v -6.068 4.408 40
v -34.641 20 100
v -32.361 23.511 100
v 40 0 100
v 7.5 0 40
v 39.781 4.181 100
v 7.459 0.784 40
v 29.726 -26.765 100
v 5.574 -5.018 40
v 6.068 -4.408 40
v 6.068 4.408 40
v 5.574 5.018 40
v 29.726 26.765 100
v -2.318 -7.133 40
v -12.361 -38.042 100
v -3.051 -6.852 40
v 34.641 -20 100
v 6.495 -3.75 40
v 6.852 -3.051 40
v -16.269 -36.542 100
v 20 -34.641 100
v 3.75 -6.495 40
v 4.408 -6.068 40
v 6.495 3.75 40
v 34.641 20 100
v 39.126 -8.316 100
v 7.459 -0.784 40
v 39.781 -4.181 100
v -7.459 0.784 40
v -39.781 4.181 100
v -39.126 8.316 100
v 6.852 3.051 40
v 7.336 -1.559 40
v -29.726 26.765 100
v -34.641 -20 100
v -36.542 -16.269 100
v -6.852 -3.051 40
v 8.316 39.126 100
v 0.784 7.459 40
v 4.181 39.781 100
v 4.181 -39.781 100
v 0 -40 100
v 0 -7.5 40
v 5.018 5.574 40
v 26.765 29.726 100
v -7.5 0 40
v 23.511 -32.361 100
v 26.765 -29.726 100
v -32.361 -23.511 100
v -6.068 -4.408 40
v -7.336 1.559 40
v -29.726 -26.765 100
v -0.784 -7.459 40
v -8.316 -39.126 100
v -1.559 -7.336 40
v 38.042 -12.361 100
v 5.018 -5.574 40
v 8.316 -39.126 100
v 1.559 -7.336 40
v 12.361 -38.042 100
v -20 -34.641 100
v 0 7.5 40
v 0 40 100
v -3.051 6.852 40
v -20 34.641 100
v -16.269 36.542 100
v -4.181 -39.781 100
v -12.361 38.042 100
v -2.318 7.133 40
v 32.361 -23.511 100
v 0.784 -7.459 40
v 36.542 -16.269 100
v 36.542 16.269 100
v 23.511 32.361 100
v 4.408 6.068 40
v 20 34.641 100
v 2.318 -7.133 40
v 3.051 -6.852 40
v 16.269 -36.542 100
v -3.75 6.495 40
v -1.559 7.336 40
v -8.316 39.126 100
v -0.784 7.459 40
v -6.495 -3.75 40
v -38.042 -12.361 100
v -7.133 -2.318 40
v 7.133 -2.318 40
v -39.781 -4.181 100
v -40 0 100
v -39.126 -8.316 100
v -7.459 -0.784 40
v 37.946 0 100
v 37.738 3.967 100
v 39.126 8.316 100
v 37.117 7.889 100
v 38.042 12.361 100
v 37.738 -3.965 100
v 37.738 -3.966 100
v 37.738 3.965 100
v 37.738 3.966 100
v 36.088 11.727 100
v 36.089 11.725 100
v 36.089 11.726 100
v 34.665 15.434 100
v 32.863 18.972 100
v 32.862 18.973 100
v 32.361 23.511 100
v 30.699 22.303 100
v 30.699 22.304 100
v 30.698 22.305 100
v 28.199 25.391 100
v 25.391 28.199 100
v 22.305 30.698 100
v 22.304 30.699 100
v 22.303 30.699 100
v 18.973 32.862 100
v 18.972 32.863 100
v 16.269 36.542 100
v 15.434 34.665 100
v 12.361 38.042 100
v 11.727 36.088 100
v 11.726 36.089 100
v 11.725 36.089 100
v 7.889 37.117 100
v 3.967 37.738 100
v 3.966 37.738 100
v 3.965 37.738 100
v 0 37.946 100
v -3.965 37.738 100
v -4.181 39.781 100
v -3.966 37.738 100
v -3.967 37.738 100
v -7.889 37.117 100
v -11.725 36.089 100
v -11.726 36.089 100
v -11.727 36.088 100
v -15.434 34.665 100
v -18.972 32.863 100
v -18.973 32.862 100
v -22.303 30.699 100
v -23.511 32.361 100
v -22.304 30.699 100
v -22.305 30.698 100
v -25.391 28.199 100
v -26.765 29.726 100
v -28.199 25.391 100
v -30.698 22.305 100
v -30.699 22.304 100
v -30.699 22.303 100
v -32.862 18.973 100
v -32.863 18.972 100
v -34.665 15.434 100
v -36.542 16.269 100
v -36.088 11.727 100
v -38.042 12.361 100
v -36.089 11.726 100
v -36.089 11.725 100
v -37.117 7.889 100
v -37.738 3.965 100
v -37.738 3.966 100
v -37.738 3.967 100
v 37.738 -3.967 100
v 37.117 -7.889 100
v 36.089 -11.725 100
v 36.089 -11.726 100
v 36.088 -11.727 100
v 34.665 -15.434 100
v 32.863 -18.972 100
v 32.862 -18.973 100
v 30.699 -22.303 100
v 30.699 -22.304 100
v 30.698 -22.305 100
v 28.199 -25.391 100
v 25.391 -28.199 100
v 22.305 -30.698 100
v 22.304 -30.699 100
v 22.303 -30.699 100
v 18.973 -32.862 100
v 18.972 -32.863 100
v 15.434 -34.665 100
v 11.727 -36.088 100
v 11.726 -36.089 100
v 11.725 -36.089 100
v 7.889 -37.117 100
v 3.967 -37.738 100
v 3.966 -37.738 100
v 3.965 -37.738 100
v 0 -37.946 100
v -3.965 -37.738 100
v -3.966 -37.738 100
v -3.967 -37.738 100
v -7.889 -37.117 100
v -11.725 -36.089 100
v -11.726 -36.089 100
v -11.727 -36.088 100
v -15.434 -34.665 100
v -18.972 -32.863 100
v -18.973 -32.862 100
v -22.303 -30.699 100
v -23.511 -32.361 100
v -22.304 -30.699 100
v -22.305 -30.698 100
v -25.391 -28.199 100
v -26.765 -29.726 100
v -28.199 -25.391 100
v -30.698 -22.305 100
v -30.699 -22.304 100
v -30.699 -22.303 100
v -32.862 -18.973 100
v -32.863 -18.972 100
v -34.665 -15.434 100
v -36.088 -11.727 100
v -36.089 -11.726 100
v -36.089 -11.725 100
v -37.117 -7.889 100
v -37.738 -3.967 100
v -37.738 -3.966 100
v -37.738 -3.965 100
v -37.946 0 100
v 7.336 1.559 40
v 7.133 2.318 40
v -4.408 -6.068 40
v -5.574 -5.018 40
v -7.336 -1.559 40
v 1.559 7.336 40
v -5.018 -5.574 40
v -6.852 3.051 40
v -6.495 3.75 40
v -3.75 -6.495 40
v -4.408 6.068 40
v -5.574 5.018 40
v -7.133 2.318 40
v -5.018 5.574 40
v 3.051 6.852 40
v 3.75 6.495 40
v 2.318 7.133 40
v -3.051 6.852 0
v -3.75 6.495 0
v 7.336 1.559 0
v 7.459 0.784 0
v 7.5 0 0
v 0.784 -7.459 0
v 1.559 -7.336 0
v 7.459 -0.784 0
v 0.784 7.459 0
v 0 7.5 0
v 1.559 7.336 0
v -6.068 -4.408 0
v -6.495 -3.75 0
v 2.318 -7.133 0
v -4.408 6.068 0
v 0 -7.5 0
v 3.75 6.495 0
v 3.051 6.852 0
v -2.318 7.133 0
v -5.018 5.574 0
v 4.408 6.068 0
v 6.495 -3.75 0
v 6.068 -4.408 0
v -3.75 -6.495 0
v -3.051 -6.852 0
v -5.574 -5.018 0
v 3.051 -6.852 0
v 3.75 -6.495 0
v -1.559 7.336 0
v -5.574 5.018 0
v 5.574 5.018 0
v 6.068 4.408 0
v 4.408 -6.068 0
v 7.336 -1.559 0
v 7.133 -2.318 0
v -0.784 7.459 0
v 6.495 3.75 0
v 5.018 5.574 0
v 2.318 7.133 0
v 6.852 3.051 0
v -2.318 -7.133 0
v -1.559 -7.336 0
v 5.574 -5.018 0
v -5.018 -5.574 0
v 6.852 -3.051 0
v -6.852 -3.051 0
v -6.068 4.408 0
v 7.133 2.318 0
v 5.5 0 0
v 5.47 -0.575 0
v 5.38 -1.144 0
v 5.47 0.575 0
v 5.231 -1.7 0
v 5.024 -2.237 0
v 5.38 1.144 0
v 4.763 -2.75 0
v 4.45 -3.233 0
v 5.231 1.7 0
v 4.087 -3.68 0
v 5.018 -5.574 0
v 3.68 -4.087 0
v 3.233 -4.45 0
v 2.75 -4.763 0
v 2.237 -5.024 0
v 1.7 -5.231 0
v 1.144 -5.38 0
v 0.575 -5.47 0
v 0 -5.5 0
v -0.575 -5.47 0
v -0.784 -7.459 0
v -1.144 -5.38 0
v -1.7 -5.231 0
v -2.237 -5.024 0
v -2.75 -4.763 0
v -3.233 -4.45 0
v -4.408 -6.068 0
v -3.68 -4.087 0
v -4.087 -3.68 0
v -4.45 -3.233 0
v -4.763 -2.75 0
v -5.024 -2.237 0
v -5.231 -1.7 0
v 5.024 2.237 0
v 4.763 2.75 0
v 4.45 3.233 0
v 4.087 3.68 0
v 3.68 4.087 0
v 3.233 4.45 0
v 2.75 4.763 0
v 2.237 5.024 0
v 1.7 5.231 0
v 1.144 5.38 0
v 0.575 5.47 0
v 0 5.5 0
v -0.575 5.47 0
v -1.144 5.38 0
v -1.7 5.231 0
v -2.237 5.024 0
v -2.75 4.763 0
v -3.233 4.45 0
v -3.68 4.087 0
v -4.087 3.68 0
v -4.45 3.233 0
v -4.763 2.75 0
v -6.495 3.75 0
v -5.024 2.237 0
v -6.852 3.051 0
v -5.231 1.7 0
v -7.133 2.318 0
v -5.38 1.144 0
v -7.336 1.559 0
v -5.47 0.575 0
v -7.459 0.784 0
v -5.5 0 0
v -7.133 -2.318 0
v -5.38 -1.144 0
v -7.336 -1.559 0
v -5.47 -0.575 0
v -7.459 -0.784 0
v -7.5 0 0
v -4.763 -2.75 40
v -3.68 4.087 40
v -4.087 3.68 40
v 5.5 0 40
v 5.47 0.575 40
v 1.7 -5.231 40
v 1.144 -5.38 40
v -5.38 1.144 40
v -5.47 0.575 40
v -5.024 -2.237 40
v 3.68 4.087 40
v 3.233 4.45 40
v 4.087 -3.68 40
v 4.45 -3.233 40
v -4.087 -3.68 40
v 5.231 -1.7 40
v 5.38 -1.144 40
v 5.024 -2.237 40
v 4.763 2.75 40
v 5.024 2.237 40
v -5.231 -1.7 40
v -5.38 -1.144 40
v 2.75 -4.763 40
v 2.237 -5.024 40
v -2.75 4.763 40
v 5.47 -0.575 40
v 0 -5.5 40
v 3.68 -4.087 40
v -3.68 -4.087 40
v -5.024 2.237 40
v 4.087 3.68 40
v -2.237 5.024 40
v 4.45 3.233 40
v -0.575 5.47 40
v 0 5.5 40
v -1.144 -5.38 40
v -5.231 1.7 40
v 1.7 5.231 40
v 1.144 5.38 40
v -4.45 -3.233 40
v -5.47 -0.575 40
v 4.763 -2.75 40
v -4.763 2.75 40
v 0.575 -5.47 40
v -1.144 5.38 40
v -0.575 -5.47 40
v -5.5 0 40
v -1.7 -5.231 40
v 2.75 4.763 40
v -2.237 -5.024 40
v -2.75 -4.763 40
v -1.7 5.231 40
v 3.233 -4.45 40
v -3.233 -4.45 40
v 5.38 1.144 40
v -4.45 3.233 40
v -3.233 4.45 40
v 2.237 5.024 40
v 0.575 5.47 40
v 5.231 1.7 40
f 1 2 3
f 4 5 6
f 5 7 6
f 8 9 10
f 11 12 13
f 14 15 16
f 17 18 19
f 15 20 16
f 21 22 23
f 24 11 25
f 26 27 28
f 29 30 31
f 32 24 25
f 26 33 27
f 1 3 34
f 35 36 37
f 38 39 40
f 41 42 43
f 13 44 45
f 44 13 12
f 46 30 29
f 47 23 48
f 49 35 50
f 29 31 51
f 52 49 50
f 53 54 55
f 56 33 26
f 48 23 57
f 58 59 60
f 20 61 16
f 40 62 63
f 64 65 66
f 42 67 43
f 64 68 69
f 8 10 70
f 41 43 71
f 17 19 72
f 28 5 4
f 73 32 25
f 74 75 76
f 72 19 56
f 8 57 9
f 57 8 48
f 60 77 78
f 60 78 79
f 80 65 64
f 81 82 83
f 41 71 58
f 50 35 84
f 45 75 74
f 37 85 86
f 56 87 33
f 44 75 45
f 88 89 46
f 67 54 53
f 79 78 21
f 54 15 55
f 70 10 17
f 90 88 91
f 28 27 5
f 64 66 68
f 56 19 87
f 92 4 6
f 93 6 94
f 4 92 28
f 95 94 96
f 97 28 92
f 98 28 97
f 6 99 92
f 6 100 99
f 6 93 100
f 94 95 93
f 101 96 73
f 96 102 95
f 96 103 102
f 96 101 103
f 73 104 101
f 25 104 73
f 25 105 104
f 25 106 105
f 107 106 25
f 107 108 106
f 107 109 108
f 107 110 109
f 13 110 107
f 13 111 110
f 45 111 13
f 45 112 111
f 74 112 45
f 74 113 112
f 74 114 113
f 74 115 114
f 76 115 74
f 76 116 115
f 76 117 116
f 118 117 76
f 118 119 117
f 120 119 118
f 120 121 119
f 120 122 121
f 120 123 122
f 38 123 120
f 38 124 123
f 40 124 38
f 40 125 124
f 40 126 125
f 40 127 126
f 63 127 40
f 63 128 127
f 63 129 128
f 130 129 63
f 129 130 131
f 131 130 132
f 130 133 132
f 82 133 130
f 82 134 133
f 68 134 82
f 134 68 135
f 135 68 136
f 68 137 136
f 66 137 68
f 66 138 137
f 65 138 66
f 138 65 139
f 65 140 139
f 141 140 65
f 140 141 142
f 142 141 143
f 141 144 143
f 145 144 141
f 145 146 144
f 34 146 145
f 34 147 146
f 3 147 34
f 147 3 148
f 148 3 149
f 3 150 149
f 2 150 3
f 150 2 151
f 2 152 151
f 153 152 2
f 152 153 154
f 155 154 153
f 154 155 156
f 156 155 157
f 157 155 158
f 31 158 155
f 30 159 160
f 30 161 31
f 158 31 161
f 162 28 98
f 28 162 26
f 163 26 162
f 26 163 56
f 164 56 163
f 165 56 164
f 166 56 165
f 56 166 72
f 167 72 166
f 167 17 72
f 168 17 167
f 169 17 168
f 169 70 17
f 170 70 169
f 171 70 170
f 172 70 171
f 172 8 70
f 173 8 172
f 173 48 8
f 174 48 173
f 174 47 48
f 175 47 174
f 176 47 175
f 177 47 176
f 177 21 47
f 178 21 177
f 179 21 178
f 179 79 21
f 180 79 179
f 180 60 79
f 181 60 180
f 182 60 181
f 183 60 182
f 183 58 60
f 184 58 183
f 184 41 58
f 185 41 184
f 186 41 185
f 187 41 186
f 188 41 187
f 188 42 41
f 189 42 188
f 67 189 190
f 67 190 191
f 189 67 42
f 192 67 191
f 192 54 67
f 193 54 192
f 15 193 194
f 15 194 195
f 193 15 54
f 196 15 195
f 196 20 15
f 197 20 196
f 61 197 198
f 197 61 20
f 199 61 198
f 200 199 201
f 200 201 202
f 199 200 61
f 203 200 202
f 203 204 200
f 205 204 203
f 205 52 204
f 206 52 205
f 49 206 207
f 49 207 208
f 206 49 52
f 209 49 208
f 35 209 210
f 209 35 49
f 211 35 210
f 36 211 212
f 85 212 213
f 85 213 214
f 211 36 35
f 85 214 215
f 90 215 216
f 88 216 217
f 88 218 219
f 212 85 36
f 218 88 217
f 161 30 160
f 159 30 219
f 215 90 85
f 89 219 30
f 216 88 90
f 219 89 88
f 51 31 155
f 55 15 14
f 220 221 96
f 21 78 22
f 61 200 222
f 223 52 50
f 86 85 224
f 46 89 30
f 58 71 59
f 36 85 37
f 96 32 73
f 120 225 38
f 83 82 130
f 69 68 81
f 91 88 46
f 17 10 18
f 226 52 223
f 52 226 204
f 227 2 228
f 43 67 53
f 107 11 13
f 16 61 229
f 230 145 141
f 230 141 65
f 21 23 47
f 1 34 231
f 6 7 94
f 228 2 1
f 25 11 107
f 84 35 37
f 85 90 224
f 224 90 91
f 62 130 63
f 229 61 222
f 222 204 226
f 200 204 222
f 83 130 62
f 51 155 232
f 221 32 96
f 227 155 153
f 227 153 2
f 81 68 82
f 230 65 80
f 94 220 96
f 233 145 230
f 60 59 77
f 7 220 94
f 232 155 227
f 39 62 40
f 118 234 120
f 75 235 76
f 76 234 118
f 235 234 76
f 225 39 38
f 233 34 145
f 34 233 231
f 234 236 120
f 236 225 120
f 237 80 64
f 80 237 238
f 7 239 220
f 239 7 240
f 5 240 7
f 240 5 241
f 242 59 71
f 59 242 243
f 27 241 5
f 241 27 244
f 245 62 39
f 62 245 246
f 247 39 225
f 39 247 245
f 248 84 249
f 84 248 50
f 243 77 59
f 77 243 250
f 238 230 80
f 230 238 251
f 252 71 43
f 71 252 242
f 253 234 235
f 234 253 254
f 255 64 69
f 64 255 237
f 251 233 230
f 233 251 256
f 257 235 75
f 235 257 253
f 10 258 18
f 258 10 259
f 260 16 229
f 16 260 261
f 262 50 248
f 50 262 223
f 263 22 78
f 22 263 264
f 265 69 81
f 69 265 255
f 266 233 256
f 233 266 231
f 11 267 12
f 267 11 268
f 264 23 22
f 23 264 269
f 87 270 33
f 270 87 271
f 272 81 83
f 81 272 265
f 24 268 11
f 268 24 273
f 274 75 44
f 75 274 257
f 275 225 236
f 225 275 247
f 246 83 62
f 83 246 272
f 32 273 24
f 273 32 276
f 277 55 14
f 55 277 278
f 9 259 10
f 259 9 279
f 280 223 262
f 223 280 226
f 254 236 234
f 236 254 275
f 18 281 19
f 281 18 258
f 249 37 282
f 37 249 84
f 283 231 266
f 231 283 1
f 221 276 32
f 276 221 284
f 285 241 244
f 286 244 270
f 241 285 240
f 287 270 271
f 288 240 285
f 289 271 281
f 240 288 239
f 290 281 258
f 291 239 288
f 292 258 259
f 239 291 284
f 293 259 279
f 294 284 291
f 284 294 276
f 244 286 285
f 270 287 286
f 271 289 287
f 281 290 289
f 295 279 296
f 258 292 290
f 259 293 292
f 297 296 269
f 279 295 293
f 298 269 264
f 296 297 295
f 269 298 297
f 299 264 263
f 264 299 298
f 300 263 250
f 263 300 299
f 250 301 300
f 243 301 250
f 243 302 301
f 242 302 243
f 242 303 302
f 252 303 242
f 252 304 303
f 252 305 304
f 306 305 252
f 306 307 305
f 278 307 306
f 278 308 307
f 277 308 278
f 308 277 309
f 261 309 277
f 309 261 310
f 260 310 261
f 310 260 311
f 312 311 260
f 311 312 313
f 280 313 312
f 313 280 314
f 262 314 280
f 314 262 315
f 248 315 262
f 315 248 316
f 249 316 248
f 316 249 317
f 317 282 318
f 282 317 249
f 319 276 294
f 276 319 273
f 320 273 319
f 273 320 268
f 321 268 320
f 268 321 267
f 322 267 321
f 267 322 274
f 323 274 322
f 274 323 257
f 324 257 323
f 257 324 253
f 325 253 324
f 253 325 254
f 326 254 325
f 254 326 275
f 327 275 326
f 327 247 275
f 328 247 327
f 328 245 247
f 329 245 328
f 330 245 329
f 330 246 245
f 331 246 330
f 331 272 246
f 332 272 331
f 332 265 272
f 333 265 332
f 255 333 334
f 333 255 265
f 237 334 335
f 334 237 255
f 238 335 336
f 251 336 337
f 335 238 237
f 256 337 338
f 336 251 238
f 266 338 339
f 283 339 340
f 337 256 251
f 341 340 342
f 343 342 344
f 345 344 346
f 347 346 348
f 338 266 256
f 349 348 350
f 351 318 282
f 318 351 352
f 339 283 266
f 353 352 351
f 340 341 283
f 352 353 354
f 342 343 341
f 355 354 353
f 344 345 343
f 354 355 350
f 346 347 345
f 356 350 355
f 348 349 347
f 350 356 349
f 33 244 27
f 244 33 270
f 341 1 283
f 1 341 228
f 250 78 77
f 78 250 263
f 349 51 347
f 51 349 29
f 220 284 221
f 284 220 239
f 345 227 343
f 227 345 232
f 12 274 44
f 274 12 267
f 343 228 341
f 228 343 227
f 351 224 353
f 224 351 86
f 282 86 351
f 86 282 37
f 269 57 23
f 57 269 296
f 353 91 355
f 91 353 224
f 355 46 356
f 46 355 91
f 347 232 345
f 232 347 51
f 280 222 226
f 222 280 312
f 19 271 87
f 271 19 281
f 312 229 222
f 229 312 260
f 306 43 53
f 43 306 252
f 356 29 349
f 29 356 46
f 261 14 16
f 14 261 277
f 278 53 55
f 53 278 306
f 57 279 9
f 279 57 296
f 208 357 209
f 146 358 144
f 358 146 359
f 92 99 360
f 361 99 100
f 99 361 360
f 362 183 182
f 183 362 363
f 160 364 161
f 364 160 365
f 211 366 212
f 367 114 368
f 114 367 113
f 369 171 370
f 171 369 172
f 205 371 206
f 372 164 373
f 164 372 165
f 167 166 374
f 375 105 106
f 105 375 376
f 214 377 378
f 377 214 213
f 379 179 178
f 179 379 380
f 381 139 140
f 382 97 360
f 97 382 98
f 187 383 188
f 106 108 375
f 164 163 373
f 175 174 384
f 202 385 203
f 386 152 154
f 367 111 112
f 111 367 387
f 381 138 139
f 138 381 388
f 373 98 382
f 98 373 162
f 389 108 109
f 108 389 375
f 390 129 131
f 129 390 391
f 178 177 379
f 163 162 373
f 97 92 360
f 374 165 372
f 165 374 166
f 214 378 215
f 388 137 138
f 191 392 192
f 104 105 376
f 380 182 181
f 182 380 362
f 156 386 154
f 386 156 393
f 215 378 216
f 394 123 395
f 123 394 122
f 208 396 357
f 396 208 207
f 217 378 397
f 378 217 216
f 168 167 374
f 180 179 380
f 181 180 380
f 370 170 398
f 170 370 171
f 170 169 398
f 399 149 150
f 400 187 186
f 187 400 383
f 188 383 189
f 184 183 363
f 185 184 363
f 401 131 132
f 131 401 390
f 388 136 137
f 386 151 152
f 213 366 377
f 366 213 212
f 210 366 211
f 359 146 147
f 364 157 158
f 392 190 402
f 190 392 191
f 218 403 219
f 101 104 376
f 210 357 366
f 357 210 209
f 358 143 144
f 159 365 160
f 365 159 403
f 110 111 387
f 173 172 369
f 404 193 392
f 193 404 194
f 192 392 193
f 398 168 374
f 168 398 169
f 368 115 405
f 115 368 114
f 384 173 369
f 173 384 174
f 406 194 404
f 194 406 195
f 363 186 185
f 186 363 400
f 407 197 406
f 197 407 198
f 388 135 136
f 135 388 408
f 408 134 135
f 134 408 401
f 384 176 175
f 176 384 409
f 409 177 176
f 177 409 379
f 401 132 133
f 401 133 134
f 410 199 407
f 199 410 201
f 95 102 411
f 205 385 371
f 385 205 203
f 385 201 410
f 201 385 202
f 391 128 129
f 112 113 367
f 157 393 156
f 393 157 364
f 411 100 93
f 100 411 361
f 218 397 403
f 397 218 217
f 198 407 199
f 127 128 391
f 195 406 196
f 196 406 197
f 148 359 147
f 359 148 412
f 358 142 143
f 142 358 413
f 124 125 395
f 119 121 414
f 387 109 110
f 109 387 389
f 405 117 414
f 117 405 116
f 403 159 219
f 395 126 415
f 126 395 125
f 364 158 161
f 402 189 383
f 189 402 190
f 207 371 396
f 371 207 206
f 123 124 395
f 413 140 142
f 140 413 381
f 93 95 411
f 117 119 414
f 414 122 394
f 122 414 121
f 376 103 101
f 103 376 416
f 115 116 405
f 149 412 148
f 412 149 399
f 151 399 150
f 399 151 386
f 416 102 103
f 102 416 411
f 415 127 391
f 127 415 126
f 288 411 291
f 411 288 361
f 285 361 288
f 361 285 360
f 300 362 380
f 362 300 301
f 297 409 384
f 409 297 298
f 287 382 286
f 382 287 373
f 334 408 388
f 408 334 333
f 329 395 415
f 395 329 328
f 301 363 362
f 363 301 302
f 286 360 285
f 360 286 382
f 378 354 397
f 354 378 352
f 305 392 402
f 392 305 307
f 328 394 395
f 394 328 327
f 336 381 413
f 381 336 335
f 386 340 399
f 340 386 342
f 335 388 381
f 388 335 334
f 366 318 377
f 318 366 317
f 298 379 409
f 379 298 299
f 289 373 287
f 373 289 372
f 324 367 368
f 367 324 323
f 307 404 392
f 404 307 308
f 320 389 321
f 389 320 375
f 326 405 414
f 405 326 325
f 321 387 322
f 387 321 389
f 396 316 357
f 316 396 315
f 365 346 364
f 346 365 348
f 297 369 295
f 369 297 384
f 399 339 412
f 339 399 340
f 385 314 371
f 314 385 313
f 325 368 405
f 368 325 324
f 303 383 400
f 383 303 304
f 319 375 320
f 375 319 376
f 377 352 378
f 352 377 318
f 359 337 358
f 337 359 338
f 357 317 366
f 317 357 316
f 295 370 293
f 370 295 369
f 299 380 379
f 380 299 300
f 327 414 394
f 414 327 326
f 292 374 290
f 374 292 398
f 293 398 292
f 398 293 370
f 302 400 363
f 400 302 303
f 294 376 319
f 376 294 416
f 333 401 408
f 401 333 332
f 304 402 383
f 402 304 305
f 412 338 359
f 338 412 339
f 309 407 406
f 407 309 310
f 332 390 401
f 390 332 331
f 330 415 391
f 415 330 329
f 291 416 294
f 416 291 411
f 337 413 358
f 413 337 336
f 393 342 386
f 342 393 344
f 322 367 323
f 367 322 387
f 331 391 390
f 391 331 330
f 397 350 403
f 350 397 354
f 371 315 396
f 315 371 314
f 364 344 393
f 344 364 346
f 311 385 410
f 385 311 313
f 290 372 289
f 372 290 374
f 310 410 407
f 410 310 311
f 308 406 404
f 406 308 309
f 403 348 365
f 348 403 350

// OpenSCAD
// Parametric Funnel
// A simple funnel with customizable top and bottom diameters

$fn = 60;

top_diameter = 80;      // Outer diameter of the wide top
spout_diameter = 15;    // Outer diameter of the narrow spout
top_height = 60;        // Height of the conical part
spout_height = 40;      // Height of the straight spout
wall_thickness = 2;     // Thickness of the walls

module main() {
    difference() {
        // Outer shell
        union() {
            // Cone section
            translate([0, 0, spout_height])
                cylinder(h = top_height, d1 = spout_diameter, d2 = top_diameter);
            // Spout section
            cylinder(h = spout_height, d = spout_diameter);
        }
        
        // Inner hollow (subtracted)
        union() {
            // Inner cone
            translate([0, 0, spout_height])
                cylinder(h = top_height + 0.1, d1 = spout_diameter - wall_thickness*2, d2 = top_diameter - wall_thickness*2);
            // Inner spout
            translate([0, 0, -0.1])
                cylinder(h = spout_height + 0.1, d = spout_diameter - wall_thickness*2);
        }
    }
}

main();
